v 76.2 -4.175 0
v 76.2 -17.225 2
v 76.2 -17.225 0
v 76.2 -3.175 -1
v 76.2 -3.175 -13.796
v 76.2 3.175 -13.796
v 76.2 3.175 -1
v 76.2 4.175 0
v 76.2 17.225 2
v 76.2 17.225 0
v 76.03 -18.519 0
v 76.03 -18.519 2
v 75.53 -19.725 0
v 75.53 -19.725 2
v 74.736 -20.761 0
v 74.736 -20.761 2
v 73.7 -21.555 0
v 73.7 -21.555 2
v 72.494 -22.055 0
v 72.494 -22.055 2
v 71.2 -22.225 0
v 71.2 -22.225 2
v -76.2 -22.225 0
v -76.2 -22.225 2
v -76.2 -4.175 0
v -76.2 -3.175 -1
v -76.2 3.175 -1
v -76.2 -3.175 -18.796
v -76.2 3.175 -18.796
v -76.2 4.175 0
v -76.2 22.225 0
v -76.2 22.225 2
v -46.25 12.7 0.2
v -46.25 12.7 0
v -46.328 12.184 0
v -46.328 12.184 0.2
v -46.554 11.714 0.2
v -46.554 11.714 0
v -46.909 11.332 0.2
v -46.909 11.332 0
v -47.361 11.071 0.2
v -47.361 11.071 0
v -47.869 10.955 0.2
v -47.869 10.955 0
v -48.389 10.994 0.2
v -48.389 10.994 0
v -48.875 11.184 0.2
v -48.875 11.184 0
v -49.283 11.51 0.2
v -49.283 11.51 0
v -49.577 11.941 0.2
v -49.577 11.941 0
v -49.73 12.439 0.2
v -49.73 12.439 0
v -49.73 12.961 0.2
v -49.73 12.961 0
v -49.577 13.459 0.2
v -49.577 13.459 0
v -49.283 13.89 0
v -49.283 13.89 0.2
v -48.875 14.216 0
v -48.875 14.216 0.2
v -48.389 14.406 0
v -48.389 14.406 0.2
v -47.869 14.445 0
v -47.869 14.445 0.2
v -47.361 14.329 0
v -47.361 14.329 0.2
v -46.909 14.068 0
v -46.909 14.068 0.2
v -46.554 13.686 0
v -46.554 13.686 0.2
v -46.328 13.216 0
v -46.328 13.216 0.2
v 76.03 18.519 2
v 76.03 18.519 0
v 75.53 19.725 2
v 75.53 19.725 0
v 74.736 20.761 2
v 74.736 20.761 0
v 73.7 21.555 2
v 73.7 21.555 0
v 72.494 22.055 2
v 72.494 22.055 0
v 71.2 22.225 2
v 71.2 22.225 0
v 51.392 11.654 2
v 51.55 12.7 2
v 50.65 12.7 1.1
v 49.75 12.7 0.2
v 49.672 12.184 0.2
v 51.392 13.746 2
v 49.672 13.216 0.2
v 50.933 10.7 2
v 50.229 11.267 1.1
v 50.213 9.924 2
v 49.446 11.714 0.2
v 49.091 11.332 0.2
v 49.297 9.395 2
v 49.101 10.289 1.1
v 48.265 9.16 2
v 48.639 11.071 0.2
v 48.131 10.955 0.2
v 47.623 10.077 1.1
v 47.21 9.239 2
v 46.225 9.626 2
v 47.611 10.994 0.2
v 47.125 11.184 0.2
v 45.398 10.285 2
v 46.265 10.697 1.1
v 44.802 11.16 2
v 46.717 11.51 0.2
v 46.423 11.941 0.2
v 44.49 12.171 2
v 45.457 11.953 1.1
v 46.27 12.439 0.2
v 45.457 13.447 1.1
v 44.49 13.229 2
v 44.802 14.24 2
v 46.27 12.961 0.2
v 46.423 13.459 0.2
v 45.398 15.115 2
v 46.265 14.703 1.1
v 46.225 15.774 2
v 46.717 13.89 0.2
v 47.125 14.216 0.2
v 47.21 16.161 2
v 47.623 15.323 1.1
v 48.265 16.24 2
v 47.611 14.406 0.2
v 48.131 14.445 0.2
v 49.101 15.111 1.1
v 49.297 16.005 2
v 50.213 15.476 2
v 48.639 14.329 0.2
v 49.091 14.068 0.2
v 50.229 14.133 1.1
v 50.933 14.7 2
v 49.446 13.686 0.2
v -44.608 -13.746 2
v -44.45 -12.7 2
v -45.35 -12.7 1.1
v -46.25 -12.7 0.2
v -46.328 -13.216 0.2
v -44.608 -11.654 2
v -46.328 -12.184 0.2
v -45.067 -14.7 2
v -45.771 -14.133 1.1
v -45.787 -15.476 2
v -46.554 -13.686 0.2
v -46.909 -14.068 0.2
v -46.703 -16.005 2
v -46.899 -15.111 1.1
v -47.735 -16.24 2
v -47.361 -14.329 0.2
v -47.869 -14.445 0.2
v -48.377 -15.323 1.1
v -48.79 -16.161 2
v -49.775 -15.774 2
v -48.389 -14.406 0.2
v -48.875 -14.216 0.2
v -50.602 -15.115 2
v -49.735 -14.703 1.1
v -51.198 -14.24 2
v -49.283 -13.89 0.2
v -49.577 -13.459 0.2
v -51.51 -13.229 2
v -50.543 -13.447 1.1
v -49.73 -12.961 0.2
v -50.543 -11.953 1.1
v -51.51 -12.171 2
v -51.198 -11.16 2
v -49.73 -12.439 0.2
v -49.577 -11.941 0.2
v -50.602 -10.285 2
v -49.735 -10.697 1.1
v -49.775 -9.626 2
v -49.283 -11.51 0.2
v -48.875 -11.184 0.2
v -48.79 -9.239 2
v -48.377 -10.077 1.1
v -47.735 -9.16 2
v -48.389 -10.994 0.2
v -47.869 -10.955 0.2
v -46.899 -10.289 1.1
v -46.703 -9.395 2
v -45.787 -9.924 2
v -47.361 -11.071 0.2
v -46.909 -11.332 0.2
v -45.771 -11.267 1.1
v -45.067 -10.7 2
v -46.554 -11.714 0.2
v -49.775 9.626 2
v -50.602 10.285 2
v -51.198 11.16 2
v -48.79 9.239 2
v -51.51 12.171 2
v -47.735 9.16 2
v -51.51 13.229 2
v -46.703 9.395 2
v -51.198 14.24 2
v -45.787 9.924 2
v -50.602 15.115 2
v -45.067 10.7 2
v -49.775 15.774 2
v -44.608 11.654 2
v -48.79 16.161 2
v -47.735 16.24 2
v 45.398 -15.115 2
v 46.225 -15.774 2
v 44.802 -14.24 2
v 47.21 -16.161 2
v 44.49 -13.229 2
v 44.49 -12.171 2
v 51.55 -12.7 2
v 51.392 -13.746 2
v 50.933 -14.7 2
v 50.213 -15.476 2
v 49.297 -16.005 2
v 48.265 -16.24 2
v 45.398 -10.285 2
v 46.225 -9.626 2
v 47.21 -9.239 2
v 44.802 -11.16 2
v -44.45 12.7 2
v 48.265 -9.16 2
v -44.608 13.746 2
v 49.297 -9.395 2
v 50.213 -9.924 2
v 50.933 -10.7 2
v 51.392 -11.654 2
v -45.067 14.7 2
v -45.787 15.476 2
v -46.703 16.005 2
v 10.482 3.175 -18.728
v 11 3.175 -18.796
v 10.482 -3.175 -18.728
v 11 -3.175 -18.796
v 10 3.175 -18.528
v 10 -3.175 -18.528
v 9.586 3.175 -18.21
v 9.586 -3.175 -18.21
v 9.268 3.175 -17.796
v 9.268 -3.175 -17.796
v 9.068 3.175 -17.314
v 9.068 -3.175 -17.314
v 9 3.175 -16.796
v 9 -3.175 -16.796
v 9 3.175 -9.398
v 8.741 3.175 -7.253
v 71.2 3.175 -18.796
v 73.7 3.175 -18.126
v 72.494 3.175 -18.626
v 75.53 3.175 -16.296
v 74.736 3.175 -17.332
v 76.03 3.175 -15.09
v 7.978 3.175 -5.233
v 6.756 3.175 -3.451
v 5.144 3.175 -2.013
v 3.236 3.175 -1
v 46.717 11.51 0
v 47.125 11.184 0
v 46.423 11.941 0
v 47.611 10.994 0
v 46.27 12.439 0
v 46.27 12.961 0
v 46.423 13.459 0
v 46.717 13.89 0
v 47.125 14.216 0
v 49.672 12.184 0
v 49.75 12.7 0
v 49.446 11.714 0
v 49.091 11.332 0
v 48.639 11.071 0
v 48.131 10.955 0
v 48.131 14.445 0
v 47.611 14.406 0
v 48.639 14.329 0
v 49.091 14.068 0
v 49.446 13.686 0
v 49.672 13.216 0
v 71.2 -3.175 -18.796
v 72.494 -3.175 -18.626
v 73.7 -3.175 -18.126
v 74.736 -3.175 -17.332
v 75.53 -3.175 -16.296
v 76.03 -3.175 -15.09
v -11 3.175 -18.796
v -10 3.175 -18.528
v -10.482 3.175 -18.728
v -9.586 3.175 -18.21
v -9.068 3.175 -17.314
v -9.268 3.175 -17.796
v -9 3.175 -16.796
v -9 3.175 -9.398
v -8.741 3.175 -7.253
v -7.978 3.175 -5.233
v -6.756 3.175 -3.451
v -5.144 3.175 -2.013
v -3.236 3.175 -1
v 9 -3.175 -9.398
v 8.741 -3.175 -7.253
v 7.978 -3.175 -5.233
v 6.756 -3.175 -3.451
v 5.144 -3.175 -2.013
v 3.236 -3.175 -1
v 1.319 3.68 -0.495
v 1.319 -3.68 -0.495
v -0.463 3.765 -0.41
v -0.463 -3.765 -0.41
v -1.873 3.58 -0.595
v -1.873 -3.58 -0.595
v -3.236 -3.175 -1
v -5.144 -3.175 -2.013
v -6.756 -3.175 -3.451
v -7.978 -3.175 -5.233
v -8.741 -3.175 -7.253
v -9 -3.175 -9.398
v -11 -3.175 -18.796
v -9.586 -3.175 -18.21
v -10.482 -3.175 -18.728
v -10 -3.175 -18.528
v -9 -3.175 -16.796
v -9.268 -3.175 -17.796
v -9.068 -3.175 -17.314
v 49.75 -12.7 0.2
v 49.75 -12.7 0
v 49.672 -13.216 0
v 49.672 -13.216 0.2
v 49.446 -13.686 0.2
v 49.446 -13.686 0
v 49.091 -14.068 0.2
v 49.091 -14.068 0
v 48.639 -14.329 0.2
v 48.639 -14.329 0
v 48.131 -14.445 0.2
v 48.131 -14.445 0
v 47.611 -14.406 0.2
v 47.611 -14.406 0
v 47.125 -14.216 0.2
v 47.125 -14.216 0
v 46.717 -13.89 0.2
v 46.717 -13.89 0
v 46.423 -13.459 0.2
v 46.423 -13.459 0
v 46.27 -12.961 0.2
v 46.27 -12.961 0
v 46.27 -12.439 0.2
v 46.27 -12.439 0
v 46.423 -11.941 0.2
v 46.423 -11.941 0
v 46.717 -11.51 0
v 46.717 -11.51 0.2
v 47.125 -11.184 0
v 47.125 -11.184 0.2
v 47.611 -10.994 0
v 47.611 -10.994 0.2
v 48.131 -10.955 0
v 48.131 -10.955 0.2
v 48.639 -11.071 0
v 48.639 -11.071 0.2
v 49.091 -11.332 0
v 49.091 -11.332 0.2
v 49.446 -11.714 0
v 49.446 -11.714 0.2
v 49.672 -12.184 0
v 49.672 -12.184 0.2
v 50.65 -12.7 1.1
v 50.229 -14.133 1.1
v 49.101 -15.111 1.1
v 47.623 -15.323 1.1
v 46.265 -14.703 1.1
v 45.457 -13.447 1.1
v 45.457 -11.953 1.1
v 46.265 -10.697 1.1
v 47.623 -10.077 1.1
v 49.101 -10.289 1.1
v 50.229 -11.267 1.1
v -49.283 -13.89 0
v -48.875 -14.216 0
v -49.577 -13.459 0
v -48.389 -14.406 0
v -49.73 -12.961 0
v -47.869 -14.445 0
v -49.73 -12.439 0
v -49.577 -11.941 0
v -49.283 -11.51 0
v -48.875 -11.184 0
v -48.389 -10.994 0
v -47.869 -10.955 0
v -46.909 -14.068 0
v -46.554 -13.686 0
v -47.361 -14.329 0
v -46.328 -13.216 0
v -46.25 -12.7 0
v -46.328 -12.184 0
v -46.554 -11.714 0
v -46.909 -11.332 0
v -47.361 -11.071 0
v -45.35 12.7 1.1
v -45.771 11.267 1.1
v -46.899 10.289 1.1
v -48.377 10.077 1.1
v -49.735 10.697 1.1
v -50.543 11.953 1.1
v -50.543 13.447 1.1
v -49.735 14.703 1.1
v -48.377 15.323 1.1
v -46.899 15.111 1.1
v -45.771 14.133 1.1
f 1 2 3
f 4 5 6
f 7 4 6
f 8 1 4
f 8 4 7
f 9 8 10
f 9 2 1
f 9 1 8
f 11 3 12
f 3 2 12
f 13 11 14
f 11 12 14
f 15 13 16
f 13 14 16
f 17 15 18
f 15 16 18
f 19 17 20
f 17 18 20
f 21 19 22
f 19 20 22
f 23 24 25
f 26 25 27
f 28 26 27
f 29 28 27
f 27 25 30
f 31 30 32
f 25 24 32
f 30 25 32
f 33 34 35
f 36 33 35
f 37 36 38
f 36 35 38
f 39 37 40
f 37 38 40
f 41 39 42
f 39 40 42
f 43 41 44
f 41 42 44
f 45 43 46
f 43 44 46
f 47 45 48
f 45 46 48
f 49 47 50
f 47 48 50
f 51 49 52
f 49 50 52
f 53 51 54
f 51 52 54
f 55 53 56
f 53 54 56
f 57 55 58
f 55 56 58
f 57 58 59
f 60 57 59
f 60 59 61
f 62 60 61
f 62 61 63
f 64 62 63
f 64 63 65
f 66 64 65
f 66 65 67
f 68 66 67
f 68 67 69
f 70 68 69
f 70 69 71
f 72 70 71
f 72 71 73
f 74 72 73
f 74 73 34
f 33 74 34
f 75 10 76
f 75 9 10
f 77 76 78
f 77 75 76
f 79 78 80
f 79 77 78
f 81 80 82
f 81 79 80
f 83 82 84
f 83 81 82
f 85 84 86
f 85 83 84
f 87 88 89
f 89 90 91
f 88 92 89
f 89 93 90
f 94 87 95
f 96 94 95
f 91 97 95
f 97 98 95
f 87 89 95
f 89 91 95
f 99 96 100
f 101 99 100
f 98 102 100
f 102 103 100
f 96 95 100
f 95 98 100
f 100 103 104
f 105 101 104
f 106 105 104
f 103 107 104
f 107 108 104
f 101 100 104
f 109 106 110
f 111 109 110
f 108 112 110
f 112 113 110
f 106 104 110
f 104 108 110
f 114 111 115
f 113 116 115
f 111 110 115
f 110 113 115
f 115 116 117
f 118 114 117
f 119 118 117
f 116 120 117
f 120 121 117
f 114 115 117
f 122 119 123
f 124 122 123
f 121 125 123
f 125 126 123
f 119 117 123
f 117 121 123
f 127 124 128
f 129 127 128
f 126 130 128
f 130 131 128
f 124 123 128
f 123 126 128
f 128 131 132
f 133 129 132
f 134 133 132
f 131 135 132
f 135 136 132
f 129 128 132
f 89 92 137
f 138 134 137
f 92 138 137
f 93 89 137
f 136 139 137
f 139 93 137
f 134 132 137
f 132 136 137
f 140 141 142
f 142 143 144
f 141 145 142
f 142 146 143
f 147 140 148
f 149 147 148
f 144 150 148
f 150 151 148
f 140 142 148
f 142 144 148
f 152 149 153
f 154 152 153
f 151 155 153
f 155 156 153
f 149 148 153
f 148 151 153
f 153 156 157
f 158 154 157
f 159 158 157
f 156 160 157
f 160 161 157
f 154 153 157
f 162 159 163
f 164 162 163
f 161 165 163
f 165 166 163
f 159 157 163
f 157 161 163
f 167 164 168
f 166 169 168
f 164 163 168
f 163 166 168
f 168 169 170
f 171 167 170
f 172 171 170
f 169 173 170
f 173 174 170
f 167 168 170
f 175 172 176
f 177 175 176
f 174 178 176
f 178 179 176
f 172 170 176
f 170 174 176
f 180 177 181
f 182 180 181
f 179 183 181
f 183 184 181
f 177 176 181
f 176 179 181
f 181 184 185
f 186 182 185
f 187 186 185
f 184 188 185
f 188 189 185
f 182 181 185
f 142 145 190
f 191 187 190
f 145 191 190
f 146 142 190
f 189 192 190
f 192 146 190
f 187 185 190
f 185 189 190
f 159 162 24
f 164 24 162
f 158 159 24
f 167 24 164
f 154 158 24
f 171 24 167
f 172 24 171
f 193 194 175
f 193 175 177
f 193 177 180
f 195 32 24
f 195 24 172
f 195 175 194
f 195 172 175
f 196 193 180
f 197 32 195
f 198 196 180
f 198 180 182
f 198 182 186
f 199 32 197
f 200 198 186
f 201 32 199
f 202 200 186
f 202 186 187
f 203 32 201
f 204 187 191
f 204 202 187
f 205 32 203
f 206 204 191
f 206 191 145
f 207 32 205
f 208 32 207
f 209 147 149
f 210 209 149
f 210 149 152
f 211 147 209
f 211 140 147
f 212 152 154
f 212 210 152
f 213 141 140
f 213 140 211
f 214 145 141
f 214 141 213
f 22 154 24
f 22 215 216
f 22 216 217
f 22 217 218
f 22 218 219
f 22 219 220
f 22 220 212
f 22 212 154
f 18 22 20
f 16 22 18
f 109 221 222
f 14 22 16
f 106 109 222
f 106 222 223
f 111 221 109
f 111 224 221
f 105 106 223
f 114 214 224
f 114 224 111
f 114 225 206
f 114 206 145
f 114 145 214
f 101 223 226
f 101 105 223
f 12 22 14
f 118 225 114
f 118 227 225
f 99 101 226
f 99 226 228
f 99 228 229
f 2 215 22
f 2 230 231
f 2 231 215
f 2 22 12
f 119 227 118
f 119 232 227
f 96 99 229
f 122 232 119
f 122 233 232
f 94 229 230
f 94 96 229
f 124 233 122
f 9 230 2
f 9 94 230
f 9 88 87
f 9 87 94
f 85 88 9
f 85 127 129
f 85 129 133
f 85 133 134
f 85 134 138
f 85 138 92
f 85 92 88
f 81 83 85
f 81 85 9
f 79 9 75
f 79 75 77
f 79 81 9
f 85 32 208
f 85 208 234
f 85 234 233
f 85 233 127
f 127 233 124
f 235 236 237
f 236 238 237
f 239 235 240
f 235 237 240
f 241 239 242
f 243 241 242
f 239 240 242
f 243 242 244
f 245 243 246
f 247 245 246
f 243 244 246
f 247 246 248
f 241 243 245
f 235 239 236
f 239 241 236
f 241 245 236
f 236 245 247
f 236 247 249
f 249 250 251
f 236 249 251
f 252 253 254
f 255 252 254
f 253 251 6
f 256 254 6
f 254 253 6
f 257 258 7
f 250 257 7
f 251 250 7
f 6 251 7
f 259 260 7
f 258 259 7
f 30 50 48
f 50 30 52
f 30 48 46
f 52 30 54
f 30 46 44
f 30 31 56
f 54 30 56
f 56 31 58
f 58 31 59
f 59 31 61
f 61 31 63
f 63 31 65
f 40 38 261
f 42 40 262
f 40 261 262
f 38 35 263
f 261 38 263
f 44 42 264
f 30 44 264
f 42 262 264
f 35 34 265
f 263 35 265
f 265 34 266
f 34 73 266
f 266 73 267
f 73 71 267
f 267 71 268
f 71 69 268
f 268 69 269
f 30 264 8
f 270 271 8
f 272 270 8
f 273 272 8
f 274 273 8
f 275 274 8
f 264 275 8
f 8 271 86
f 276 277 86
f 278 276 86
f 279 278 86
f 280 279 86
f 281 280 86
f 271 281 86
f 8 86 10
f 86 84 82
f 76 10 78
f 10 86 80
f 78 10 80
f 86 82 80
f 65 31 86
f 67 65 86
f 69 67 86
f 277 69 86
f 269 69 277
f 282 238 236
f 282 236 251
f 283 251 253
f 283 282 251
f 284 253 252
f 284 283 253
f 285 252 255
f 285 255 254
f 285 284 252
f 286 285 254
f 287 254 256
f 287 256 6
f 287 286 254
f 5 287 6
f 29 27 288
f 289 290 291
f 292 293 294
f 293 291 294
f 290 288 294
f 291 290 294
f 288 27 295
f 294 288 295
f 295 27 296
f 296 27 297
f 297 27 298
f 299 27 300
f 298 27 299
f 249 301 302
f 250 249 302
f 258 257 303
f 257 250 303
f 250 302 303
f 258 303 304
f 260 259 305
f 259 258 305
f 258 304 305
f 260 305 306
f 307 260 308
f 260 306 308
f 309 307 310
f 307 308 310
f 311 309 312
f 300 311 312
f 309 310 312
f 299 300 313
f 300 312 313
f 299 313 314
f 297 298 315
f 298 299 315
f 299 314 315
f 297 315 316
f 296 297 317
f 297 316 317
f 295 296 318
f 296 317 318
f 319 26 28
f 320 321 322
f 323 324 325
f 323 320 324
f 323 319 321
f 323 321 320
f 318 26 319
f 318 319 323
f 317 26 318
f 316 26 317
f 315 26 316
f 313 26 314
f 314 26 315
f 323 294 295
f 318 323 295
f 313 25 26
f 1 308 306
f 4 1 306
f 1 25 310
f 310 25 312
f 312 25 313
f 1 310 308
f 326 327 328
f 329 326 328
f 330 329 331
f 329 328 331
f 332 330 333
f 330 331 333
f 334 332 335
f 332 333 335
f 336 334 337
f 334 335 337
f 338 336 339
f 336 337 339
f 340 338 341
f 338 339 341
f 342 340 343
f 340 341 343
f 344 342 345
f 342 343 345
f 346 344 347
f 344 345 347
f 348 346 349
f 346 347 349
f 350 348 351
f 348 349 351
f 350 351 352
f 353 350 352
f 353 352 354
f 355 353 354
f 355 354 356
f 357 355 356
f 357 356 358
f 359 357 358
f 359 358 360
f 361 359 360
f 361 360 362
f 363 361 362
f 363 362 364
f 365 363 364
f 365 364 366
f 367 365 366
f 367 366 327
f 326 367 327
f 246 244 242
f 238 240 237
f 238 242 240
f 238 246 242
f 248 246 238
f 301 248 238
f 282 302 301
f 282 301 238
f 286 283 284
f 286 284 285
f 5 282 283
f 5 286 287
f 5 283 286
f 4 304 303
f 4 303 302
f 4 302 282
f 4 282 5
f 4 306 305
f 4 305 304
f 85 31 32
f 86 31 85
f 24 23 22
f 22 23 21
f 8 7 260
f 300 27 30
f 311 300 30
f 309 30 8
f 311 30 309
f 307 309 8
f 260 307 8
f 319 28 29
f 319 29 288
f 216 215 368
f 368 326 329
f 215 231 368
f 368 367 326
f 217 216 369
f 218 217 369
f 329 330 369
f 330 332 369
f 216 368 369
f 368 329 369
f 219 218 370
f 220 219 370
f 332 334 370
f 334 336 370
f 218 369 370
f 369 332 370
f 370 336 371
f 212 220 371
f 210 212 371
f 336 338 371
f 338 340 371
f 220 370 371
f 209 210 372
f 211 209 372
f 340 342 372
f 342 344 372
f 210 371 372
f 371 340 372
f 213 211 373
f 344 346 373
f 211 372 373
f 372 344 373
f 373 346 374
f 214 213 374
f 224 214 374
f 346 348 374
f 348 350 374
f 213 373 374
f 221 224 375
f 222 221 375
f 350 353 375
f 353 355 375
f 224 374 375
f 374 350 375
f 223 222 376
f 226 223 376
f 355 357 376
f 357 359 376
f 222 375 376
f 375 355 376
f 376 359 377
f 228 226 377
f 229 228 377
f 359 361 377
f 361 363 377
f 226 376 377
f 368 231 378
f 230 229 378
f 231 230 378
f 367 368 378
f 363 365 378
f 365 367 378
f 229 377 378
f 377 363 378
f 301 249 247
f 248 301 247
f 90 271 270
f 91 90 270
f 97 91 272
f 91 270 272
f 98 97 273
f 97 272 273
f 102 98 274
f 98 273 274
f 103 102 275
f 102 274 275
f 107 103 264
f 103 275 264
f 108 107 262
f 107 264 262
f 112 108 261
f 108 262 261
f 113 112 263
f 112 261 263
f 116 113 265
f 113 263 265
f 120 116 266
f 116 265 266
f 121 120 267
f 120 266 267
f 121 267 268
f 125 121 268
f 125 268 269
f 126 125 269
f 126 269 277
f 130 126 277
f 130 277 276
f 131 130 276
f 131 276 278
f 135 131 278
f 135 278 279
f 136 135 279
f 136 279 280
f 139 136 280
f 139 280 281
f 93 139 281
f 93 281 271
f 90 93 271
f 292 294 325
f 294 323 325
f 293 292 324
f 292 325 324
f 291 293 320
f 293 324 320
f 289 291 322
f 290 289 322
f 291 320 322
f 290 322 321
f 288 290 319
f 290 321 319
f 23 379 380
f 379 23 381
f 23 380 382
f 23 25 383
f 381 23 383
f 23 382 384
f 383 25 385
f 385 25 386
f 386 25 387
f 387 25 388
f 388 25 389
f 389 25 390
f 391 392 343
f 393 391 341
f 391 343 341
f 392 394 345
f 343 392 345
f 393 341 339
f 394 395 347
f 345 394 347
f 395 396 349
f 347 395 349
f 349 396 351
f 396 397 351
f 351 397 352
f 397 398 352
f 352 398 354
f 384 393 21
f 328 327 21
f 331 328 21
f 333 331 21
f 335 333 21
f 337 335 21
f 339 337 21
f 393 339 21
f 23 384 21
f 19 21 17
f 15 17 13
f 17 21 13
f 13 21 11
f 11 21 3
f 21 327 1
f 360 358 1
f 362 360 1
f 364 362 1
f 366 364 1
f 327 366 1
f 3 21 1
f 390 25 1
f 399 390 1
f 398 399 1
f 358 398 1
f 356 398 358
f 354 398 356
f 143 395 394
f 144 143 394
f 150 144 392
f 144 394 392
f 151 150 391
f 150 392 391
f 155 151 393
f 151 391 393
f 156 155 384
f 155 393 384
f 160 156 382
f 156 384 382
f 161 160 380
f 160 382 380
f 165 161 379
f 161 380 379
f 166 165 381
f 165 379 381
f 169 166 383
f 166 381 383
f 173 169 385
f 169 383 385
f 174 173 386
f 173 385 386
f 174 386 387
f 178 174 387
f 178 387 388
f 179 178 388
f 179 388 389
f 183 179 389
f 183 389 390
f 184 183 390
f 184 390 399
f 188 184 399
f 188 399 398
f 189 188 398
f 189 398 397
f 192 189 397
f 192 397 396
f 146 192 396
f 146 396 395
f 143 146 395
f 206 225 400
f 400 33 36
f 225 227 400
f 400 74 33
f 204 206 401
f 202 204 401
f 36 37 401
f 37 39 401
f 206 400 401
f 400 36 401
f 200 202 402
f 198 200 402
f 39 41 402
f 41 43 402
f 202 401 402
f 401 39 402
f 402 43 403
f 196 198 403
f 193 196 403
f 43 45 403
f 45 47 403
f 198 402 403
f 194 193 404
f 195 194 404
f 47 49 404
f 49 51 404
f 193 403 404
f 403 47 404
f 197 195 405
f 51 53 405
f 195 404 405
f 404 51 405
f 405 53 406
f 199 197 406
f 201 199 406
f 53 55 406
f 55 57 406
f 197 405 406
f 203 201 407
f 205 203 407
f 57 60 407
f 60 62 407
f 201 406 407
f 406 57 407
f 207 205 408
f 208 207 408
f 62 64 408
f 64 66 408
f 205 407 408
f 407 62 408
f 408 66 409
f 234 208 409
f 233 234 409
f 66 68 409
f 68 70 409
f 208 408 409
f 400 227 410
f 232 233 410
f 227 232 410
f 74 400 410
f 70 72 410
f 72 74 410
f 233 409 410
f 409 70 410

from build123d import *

# Parameters (mm, degrees)
F0_W         = 152.4
F0_H         = 44.45
F1_DEPTH     = 2
F2_W         = 152.4
F2_H         = 6.35
F3_DEPTH     = 18.796
F4_R         = 1.75
F5_DEPTH     = 25
F7_DEPTH     = 25.401
F8_SIZE      = 1.8
F9_T4_DEPTH  = 152.4
F9_S5_R      = 9
F9_T6_DEPTH  = 78
F9_T10_DEPTH = 152.4
F9_S11_R     = 9
F9_T12_DEPTH = 78
F10_R        = 2
F11_R        = 5


# Not quite as in the source:
# - a fillet or chamfer that OpenCascade refuses, or shapes differently, is made with other operations: its cross-section is extruded or revolved along the edge and cut away or added
# - a feature names something its author has since deleted; it is built from what else it names


with BuildPart() as f1:
    # F0 (on Top) → F1 (new body)
    with BuildSketch(Plane.XY):
        Rectangle(F0_W, F0_H)
    extrude(amount=F1_DEPTH)

    # F2 (on face) → F3 (join)
    with BuildSketch(Plane(origin=(0, 0, 0), x_dir=(1, 0, 0), z_dir=(0, 0, -1))):
        Rectangle(F2_W, F2_H)
    extrude(amount=F3_DEPTH)

    # F4 (on face) → F5 (cut)
    with BuildSketch(Plane(origin=(0, 0, 0), x_dir=(1, 0, 0), z_dir=(0, 0, -1))):
        with Locations((48, -12.7)):
            Circle(F4_R)
        with Locations((-48, -12.7)):
            Circle(F4_R)
        with Locations((-48, 12.7)):
            Circle(F4_R)
        with Locations((48, 12.7)):
            Circle(F4_R)
    extrude(amount=-F5_DEPTH, mode=Mode.SUBTRACT)

    # F6 (on face) → F7 (cut, through all)
    with BuildSketch(Plane(origin=(0, 3.175, 0), x_dir=(-1, 0, 0), z_dir=(0, 1, 0))):
        with BuildLine():
            ThreePointArc((-9, -9.398), (0, -18.398), (9, -9.398))
            ThreePointArc((9, -9.398), (0, -0.398), (-9, -9.398))
        make_face()
        with BuildLine():
            Line((9, -18.796), (9, -9.398))
            ThreePointArc((9, -9.398), (0, -18.398), (-9, -9.398))
            Line((-9, -9.398), (-9, -18.796))
            Line((-9, -18.796), (9, -18.796))
        make_face()
    extrude(amount=-F7_DEPTH, mode=Mode.SUBTRACT)

    # F8
    f8_edges = [f1.edges().sort_by_distance(p)[0] for p in [
        (46.25, -12.7, 2),
        (-49.75, -12.7, 2),
        (-49.75, 12.7, 2),
        (46.25, 12.7, 2),
    ]]
    chamfer(f8_edges, length=F8_SIZE)

    # F9: chamfer of 1 on 2 edges, made by hand


with BuildPart() as f9_tool2:
    # F9_s3 → F9_t4 (new body)
    with BuildSketch(Plane.YZ.offset(-76.2)):
        Polygon((3.175, -1), (4.175, 0), (3.175, 0), align=None)
    extrude(amount=F9_T4_DEPTH)

    # F9_s5 → F9_t6 (cut, symmetric)
    with BuildSketch(Plane.XZ.offset(-3.7)):
        with Locations((0, -9.398)):
            Circle(F9_S5_R)
    extrude(amount=F9_T6_DEPTH, both=True, mode=Mode.SUBTRACT)


with BuildPart() as f1_1:
    add(f1.part)

    # F9_t1: union F9_tool2
    add(f9_tool2.part)


with BuildPart() as f9_tool8:
    # F9_s9 → F9_t10 (new body)
    with BuildSketch(Plane.YZ.offset(76.2)):
        Polygon((-4.175, 0), (-3.175, -1), (-3.175, 0), align=None)
    extrude(amount=-F9_T10_DEPTH)

    # F9_s11 → F9_t12 (cut, symmetric)
    with BuildSketch(Plane.XZ.offset(3.7)):
        with Locations((0, -9.398)):
            Circle(F9_S11_R)
    extrude(amount=F9_T12_DEPTH, both=True, mode=Mode.SUBTRACT)


with BuildPart() as f1_2:
    add(f1_1.part)

    # F9_t7: union F9_tool8
    add(f9_tool8.part)

    # F10
    f10_edges = [f1_2.edges().sort_by_distance(p)[0] for p in [
        (9, 0, -18.796),
        (-9, 0, -18.796),
    ]]
    fillet(f10_edges, radius=F10_R)

    # F11
    f11_edges = [f1_2.edges().sort_by_distance(p)[0] for p in [
        (76.2, 0, -18.796),
        (76.2, -22.225, 1),
        (76.2, 22.225, 1),
    ]]
    fillet(f11_edges, radius=F11_R)


solid = f1_2.part
